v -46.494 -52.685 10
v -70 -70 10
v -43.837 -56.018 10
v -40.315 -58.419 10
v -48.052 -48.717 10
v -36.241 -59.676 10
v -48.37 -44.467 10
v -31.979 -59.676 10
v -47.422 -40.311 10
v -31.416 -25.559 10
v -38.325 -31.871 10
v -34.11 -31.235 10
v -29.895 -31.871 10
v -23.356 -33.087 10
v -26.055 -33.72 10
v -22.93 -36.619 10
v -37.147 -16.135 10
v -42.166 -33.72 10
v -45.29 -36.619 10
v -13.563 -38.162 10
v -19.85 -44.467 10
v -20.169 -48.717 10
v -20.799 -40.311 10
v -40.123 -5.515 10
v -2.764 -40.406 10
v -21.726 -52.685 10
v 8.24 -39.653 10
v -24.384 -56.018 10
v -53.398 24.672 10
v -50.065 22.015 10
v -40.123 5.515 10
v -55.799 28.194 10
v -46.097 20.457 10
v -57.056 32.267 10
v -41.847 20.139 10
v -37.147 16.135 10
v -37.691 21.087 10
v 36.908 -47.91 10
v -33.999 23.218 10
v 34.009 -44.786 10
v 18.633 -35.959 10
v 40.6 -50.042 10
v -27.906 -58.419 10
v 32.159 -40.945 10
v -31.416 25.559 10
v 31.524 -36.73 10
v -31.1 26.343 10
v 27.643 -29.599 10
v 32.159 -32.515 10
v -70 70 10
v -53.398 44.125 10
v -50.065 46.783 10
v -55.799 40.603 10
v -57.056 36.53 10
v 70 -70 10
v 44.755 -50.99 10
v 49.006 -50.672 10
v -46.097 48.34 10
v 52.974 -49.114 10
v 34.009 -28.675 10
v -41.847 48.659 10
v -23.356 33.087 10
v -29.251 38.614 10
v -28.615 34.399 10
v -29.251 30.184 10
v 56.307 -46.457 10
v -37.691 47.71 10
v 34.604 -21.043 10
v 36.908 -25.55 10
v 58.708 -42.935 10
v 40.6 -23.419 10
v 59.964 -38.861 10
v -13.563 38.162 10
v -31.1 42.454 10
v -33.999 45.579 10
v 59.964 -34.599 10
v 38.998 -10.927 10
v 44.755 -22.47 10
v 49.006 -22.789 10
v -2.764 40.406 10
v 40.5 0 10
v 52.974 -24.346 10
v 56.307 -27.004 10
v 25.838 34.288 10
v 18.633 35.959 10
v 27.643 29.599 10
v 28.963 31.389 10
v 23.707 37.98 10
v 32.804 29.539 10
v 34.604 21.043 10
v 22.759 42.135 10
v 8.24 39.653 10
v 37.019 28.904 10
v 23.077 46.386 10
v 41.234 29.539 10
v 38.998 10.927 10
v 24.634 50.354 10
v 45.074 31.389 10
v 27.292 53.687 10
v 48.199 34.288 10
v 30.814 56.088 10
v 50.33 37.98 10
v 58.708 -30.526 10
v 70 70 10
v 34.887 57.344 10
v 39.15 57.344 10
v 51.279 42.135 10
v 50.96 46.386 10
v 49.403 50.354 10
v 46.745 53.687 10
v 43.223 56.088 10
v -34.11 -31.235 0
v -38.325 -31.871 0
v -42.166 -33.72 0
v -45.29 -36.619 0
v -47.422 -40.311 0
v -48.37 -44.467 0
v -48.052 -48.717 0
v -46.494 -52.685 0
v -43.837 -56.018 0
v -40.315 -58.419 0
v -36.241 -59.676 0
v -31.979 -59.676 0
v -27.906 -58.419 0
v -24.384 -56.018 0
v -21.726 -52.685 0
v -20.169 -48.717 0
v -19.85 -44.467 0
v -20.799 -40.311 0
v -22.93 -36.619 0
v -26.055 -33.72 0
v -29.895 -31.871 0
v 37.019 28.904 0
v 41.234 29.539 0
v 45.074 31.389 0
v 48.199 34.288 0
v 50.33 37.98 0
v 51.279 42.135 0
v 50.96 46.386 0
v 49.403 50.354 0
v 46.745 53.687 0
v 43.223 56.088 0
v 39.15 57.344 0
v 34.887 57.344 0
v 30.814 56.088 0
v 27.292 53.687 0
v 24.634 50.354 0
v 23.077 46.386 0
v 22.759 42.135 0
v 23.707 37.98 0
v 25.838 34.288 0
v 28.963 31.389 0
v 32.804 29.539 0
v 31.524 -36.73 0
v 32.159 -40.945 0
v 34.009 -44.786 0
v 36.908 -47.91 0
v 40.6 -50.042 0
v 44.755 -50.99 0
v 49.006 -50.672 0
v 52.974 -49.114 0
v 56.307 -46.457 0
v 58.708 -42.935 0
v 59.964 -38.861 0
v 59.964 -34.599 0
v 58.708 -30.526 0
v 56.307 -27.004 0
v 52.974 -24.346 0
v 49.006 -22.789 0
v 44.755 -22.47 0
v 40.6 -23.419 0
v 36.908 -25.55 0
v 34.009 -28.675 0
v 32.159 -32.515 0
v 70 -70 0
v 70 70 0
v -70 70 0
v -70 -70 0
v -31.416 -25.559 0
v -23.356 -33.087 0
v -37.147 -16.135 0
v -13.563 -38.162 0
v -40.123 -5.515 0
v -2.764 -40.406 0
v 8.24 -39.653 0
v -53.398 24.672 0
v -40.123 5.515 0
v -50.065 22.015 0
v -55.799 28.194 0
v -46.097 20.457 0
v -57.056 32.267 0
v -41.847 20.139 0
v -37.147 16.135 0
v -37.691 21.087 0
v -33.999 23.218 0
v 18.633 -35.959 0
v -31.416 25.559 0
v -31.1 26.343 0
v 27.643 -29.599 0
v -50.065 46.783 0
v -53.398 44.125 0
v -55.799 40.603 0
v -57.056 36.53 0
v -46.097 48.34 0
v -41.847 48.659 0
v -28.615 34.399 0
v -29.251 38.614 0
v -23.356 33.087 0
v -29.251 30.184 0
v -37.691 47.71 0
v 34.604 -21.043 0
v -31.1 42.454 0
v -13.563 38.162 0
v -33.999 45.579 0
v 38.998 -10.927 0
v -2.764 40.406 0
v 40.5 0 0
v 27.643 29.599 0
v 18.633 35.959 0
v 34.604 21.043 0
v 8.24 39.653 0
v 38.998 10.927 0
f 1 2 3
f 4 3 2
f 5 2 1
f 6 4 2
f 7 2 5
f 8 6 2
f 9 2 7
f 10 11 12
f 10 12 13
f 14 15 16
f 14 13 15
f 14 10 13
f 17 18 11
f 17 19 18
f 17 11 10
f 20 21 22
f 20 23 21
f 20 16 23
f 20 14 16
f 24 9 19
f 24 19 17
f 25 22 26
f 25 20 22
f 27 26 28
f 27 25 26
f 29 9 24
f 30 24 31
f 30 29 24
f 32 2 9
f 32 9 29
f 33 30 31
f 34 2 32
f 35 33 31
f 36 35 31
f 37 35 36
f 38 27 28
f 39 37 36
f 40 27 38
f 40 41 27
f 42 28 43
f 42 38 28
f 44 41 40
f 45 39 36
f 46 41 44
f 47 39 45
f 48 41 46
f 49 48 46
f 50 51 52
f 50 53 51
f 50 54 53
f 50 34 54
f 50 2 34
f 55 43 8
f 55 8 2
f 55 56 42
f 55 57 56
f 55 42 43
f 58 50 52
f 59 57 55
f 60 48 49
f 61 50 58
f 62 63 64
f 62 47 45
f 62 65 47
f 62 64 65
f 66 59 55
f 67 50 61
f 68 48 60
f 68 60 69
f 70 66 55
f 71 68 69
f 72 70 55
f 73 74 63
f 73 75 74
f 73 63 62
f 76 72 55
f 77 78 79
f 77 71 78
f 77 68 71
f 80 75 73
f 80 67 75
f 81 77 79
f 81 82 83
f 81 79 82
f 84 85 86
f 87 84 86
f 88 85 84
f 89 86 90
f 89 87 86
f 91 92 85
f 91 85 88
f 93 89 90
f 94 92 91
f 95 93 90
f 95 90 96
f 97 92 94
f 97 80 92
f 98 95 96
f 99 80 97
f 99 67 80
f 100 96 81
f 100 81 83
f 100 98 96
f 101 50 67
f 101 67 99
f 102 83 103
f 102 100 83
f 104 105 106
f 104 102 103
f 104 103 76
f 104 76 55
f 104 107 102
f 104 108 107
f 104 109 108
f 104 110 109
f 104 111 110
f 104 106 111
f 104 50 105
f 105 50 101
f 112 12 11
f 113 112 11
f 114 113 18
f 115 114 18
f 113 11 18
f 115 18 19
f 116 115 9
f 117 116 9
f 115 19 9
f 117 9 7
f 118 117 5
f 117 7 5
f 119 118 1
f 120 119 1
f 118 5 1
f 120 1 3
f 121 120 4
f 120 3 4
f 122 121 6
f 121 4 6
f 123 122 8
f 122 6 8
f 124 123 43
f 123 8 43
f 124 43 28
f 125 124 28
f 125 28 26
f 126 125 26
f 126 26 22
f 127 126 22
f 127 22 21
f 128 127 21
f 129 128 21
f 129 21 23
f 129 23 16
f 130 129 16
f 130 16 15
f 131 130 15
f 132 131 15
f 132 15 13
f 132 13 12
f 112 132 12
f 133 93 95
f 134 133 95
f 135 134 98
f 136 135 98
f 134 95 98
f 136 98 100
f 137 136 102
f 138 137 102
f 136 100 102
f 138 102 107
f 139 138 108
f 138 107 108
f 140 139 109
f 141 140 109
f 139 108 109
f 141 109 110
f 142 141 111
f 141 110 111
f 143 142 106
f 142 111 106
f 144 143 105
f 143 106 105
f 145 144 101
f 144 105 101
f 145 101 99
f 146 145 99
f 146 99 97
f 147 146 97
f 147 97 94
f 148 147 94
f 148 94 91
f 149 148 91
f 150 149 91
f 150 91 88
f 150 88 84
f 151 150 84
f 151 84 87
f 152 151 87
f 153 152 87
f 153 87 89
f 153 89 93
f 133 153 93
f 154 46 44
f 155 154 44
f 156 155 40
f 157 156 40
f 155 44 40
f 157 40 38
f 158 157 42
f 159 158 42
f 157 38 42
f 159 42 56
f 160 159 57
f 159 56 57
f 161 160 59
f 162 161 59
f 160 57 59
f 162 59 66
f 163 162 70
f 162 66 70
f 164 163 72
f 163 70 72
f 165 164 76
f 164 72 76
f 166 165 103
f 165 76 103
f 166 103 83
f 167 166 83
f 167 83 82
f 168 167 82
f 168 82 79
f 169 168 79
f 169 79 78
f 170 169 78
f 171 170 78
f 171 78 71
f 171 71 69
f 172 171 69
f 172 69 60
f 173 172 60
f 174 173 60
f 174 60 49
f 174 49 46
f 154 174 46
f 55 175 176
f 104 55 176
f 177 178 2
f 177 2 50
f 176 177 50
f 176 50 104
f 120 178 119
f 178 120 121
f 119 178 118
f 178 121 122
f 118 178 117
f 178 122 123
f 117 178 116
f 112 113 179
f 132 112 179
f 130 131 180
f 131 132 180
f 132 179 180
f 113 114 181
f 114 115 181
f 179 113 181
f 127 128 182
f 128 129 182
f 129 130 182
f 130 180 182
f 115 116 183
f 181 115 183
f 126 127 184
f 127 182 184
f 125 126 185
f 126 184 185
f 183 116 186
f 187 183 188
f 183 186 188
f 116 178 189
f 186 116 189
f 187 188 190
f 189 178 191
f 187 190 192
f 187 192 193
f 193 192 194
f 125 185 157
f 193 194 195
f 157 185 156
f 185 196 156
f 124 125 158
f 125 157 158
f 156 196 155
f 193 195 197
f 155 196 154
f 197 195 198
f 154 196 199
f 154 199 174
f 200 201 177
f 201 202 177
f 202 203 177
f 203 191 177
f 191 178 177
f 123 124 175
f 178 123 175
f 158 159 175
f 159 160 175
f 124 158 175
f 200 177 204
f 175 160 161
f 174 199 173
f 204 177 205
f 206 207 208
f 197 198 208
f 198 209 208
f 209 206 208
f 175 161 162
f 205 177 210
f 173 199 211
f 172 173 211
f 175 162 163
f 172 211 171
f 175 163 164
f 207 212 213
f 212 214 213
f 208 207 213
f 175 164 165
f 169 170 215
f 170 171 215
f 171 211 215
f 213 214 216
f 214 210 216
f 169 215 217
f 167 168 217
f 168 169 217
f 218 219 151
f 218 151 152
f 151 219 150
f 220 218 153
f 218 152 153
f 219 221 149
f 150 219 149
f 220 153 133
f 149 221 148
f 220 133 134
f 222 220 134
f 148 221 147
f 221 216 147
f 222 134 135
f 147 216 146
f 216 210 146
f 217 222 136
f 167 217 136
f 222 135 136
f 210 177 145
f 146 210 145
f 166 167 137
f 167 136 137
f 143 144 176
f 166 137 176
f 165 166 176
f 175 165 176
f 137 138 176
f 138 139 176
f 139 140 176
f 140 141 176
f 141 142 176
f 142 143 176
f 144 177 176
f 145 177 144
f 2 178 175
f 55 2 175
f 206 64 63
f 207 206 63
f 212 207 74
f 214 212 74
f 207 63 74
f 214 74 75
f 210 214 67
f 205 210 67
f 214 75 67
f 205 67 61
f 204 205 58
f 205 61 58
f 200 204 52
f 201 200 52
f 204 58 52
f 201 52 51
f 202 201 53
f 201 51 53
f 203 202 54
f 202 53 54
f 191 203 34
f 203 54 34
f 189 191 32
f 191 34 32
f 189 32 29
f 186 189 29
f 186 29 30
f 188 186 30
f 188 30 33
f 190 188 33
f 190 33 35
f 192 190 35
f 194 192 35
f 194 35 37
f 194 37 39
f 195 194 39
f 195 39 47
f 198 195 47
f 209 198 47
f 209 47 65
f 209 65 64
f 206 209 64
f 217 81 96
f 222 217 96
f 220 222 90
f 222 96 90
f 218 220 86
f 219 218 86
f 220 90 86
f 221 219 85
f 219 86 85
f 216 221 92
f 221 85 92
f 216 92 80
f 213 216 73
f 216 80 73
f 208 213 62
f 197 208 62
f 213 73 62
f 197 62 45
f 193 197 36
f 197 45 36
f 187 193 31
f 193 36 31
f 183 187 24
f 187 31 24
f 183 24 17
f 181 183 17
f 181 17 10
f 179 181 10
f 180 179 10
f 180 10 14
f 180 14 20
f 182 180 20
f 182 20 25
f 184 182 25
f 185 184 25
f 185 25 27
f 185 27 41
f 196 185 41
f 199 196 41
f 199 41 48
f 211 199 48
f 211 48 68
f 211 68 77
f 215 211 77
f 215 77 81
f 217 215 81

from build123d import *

# Parameters (mm, degrees)
SKETCH2_W           = 140
SKETCH2_H           = 140
BOSS_EXTRUDE1_DEPTH = 10
SKETCH3_R           = 14.3
CUT_EXTRUDE1_DEPTH  = 100.498743711
CIRPATTERN1_COUNT   = 4
SKETCH4_R           = 40.5
CUT_EXTRUDE2_DEPTH  = 100.498743711


with BuildPart() as part:
    # Sketch2 → Boss-Extrude1 (new body)
    with BuildSketch(Plane.XY):
        Rectangle(SKETCH2_W, SKETCH2_H)
    extrude(amount=BOSS_EXTRUDE1_DEPTH)

    # Sketch3 → Cut-Extrude1 (cut, through all)
    with BuildSketch(Plane.XY.offset(10)):
        with Locations((-42.915392768, 34.398678224)):
            Circle(SKETCH3_R)
    cut_extrude1 = extrude(amount=-CUT_EXTRUDE1_DEPTH, mode=Mode.SUBTRACT)

    # CirPattern1: Cut-Extrude1 ×4 about axis
    cirpattern1_axis = Axis((1.454294092, -1.165684182, 0), (0, 0, 1))
    for i in range(1, CIRPATTERN1_COUNT):
        add(cut_extrude1.rotate(cirpattern1_axis, i * 360 / CIRPATTERN1_COUNT), mode=Mode.SUBTRACT)

    # Sketch4 → Cut-Extrude2 (cut, through all)
    with BuildSketch(Plane.XY.offset(10)):
        Circle(SKETCH4_R)
    extrude(amount=-CUT_EXTRUDE2_DEPTH, mode=Mode.SUBTRACT)


solid = part.part
